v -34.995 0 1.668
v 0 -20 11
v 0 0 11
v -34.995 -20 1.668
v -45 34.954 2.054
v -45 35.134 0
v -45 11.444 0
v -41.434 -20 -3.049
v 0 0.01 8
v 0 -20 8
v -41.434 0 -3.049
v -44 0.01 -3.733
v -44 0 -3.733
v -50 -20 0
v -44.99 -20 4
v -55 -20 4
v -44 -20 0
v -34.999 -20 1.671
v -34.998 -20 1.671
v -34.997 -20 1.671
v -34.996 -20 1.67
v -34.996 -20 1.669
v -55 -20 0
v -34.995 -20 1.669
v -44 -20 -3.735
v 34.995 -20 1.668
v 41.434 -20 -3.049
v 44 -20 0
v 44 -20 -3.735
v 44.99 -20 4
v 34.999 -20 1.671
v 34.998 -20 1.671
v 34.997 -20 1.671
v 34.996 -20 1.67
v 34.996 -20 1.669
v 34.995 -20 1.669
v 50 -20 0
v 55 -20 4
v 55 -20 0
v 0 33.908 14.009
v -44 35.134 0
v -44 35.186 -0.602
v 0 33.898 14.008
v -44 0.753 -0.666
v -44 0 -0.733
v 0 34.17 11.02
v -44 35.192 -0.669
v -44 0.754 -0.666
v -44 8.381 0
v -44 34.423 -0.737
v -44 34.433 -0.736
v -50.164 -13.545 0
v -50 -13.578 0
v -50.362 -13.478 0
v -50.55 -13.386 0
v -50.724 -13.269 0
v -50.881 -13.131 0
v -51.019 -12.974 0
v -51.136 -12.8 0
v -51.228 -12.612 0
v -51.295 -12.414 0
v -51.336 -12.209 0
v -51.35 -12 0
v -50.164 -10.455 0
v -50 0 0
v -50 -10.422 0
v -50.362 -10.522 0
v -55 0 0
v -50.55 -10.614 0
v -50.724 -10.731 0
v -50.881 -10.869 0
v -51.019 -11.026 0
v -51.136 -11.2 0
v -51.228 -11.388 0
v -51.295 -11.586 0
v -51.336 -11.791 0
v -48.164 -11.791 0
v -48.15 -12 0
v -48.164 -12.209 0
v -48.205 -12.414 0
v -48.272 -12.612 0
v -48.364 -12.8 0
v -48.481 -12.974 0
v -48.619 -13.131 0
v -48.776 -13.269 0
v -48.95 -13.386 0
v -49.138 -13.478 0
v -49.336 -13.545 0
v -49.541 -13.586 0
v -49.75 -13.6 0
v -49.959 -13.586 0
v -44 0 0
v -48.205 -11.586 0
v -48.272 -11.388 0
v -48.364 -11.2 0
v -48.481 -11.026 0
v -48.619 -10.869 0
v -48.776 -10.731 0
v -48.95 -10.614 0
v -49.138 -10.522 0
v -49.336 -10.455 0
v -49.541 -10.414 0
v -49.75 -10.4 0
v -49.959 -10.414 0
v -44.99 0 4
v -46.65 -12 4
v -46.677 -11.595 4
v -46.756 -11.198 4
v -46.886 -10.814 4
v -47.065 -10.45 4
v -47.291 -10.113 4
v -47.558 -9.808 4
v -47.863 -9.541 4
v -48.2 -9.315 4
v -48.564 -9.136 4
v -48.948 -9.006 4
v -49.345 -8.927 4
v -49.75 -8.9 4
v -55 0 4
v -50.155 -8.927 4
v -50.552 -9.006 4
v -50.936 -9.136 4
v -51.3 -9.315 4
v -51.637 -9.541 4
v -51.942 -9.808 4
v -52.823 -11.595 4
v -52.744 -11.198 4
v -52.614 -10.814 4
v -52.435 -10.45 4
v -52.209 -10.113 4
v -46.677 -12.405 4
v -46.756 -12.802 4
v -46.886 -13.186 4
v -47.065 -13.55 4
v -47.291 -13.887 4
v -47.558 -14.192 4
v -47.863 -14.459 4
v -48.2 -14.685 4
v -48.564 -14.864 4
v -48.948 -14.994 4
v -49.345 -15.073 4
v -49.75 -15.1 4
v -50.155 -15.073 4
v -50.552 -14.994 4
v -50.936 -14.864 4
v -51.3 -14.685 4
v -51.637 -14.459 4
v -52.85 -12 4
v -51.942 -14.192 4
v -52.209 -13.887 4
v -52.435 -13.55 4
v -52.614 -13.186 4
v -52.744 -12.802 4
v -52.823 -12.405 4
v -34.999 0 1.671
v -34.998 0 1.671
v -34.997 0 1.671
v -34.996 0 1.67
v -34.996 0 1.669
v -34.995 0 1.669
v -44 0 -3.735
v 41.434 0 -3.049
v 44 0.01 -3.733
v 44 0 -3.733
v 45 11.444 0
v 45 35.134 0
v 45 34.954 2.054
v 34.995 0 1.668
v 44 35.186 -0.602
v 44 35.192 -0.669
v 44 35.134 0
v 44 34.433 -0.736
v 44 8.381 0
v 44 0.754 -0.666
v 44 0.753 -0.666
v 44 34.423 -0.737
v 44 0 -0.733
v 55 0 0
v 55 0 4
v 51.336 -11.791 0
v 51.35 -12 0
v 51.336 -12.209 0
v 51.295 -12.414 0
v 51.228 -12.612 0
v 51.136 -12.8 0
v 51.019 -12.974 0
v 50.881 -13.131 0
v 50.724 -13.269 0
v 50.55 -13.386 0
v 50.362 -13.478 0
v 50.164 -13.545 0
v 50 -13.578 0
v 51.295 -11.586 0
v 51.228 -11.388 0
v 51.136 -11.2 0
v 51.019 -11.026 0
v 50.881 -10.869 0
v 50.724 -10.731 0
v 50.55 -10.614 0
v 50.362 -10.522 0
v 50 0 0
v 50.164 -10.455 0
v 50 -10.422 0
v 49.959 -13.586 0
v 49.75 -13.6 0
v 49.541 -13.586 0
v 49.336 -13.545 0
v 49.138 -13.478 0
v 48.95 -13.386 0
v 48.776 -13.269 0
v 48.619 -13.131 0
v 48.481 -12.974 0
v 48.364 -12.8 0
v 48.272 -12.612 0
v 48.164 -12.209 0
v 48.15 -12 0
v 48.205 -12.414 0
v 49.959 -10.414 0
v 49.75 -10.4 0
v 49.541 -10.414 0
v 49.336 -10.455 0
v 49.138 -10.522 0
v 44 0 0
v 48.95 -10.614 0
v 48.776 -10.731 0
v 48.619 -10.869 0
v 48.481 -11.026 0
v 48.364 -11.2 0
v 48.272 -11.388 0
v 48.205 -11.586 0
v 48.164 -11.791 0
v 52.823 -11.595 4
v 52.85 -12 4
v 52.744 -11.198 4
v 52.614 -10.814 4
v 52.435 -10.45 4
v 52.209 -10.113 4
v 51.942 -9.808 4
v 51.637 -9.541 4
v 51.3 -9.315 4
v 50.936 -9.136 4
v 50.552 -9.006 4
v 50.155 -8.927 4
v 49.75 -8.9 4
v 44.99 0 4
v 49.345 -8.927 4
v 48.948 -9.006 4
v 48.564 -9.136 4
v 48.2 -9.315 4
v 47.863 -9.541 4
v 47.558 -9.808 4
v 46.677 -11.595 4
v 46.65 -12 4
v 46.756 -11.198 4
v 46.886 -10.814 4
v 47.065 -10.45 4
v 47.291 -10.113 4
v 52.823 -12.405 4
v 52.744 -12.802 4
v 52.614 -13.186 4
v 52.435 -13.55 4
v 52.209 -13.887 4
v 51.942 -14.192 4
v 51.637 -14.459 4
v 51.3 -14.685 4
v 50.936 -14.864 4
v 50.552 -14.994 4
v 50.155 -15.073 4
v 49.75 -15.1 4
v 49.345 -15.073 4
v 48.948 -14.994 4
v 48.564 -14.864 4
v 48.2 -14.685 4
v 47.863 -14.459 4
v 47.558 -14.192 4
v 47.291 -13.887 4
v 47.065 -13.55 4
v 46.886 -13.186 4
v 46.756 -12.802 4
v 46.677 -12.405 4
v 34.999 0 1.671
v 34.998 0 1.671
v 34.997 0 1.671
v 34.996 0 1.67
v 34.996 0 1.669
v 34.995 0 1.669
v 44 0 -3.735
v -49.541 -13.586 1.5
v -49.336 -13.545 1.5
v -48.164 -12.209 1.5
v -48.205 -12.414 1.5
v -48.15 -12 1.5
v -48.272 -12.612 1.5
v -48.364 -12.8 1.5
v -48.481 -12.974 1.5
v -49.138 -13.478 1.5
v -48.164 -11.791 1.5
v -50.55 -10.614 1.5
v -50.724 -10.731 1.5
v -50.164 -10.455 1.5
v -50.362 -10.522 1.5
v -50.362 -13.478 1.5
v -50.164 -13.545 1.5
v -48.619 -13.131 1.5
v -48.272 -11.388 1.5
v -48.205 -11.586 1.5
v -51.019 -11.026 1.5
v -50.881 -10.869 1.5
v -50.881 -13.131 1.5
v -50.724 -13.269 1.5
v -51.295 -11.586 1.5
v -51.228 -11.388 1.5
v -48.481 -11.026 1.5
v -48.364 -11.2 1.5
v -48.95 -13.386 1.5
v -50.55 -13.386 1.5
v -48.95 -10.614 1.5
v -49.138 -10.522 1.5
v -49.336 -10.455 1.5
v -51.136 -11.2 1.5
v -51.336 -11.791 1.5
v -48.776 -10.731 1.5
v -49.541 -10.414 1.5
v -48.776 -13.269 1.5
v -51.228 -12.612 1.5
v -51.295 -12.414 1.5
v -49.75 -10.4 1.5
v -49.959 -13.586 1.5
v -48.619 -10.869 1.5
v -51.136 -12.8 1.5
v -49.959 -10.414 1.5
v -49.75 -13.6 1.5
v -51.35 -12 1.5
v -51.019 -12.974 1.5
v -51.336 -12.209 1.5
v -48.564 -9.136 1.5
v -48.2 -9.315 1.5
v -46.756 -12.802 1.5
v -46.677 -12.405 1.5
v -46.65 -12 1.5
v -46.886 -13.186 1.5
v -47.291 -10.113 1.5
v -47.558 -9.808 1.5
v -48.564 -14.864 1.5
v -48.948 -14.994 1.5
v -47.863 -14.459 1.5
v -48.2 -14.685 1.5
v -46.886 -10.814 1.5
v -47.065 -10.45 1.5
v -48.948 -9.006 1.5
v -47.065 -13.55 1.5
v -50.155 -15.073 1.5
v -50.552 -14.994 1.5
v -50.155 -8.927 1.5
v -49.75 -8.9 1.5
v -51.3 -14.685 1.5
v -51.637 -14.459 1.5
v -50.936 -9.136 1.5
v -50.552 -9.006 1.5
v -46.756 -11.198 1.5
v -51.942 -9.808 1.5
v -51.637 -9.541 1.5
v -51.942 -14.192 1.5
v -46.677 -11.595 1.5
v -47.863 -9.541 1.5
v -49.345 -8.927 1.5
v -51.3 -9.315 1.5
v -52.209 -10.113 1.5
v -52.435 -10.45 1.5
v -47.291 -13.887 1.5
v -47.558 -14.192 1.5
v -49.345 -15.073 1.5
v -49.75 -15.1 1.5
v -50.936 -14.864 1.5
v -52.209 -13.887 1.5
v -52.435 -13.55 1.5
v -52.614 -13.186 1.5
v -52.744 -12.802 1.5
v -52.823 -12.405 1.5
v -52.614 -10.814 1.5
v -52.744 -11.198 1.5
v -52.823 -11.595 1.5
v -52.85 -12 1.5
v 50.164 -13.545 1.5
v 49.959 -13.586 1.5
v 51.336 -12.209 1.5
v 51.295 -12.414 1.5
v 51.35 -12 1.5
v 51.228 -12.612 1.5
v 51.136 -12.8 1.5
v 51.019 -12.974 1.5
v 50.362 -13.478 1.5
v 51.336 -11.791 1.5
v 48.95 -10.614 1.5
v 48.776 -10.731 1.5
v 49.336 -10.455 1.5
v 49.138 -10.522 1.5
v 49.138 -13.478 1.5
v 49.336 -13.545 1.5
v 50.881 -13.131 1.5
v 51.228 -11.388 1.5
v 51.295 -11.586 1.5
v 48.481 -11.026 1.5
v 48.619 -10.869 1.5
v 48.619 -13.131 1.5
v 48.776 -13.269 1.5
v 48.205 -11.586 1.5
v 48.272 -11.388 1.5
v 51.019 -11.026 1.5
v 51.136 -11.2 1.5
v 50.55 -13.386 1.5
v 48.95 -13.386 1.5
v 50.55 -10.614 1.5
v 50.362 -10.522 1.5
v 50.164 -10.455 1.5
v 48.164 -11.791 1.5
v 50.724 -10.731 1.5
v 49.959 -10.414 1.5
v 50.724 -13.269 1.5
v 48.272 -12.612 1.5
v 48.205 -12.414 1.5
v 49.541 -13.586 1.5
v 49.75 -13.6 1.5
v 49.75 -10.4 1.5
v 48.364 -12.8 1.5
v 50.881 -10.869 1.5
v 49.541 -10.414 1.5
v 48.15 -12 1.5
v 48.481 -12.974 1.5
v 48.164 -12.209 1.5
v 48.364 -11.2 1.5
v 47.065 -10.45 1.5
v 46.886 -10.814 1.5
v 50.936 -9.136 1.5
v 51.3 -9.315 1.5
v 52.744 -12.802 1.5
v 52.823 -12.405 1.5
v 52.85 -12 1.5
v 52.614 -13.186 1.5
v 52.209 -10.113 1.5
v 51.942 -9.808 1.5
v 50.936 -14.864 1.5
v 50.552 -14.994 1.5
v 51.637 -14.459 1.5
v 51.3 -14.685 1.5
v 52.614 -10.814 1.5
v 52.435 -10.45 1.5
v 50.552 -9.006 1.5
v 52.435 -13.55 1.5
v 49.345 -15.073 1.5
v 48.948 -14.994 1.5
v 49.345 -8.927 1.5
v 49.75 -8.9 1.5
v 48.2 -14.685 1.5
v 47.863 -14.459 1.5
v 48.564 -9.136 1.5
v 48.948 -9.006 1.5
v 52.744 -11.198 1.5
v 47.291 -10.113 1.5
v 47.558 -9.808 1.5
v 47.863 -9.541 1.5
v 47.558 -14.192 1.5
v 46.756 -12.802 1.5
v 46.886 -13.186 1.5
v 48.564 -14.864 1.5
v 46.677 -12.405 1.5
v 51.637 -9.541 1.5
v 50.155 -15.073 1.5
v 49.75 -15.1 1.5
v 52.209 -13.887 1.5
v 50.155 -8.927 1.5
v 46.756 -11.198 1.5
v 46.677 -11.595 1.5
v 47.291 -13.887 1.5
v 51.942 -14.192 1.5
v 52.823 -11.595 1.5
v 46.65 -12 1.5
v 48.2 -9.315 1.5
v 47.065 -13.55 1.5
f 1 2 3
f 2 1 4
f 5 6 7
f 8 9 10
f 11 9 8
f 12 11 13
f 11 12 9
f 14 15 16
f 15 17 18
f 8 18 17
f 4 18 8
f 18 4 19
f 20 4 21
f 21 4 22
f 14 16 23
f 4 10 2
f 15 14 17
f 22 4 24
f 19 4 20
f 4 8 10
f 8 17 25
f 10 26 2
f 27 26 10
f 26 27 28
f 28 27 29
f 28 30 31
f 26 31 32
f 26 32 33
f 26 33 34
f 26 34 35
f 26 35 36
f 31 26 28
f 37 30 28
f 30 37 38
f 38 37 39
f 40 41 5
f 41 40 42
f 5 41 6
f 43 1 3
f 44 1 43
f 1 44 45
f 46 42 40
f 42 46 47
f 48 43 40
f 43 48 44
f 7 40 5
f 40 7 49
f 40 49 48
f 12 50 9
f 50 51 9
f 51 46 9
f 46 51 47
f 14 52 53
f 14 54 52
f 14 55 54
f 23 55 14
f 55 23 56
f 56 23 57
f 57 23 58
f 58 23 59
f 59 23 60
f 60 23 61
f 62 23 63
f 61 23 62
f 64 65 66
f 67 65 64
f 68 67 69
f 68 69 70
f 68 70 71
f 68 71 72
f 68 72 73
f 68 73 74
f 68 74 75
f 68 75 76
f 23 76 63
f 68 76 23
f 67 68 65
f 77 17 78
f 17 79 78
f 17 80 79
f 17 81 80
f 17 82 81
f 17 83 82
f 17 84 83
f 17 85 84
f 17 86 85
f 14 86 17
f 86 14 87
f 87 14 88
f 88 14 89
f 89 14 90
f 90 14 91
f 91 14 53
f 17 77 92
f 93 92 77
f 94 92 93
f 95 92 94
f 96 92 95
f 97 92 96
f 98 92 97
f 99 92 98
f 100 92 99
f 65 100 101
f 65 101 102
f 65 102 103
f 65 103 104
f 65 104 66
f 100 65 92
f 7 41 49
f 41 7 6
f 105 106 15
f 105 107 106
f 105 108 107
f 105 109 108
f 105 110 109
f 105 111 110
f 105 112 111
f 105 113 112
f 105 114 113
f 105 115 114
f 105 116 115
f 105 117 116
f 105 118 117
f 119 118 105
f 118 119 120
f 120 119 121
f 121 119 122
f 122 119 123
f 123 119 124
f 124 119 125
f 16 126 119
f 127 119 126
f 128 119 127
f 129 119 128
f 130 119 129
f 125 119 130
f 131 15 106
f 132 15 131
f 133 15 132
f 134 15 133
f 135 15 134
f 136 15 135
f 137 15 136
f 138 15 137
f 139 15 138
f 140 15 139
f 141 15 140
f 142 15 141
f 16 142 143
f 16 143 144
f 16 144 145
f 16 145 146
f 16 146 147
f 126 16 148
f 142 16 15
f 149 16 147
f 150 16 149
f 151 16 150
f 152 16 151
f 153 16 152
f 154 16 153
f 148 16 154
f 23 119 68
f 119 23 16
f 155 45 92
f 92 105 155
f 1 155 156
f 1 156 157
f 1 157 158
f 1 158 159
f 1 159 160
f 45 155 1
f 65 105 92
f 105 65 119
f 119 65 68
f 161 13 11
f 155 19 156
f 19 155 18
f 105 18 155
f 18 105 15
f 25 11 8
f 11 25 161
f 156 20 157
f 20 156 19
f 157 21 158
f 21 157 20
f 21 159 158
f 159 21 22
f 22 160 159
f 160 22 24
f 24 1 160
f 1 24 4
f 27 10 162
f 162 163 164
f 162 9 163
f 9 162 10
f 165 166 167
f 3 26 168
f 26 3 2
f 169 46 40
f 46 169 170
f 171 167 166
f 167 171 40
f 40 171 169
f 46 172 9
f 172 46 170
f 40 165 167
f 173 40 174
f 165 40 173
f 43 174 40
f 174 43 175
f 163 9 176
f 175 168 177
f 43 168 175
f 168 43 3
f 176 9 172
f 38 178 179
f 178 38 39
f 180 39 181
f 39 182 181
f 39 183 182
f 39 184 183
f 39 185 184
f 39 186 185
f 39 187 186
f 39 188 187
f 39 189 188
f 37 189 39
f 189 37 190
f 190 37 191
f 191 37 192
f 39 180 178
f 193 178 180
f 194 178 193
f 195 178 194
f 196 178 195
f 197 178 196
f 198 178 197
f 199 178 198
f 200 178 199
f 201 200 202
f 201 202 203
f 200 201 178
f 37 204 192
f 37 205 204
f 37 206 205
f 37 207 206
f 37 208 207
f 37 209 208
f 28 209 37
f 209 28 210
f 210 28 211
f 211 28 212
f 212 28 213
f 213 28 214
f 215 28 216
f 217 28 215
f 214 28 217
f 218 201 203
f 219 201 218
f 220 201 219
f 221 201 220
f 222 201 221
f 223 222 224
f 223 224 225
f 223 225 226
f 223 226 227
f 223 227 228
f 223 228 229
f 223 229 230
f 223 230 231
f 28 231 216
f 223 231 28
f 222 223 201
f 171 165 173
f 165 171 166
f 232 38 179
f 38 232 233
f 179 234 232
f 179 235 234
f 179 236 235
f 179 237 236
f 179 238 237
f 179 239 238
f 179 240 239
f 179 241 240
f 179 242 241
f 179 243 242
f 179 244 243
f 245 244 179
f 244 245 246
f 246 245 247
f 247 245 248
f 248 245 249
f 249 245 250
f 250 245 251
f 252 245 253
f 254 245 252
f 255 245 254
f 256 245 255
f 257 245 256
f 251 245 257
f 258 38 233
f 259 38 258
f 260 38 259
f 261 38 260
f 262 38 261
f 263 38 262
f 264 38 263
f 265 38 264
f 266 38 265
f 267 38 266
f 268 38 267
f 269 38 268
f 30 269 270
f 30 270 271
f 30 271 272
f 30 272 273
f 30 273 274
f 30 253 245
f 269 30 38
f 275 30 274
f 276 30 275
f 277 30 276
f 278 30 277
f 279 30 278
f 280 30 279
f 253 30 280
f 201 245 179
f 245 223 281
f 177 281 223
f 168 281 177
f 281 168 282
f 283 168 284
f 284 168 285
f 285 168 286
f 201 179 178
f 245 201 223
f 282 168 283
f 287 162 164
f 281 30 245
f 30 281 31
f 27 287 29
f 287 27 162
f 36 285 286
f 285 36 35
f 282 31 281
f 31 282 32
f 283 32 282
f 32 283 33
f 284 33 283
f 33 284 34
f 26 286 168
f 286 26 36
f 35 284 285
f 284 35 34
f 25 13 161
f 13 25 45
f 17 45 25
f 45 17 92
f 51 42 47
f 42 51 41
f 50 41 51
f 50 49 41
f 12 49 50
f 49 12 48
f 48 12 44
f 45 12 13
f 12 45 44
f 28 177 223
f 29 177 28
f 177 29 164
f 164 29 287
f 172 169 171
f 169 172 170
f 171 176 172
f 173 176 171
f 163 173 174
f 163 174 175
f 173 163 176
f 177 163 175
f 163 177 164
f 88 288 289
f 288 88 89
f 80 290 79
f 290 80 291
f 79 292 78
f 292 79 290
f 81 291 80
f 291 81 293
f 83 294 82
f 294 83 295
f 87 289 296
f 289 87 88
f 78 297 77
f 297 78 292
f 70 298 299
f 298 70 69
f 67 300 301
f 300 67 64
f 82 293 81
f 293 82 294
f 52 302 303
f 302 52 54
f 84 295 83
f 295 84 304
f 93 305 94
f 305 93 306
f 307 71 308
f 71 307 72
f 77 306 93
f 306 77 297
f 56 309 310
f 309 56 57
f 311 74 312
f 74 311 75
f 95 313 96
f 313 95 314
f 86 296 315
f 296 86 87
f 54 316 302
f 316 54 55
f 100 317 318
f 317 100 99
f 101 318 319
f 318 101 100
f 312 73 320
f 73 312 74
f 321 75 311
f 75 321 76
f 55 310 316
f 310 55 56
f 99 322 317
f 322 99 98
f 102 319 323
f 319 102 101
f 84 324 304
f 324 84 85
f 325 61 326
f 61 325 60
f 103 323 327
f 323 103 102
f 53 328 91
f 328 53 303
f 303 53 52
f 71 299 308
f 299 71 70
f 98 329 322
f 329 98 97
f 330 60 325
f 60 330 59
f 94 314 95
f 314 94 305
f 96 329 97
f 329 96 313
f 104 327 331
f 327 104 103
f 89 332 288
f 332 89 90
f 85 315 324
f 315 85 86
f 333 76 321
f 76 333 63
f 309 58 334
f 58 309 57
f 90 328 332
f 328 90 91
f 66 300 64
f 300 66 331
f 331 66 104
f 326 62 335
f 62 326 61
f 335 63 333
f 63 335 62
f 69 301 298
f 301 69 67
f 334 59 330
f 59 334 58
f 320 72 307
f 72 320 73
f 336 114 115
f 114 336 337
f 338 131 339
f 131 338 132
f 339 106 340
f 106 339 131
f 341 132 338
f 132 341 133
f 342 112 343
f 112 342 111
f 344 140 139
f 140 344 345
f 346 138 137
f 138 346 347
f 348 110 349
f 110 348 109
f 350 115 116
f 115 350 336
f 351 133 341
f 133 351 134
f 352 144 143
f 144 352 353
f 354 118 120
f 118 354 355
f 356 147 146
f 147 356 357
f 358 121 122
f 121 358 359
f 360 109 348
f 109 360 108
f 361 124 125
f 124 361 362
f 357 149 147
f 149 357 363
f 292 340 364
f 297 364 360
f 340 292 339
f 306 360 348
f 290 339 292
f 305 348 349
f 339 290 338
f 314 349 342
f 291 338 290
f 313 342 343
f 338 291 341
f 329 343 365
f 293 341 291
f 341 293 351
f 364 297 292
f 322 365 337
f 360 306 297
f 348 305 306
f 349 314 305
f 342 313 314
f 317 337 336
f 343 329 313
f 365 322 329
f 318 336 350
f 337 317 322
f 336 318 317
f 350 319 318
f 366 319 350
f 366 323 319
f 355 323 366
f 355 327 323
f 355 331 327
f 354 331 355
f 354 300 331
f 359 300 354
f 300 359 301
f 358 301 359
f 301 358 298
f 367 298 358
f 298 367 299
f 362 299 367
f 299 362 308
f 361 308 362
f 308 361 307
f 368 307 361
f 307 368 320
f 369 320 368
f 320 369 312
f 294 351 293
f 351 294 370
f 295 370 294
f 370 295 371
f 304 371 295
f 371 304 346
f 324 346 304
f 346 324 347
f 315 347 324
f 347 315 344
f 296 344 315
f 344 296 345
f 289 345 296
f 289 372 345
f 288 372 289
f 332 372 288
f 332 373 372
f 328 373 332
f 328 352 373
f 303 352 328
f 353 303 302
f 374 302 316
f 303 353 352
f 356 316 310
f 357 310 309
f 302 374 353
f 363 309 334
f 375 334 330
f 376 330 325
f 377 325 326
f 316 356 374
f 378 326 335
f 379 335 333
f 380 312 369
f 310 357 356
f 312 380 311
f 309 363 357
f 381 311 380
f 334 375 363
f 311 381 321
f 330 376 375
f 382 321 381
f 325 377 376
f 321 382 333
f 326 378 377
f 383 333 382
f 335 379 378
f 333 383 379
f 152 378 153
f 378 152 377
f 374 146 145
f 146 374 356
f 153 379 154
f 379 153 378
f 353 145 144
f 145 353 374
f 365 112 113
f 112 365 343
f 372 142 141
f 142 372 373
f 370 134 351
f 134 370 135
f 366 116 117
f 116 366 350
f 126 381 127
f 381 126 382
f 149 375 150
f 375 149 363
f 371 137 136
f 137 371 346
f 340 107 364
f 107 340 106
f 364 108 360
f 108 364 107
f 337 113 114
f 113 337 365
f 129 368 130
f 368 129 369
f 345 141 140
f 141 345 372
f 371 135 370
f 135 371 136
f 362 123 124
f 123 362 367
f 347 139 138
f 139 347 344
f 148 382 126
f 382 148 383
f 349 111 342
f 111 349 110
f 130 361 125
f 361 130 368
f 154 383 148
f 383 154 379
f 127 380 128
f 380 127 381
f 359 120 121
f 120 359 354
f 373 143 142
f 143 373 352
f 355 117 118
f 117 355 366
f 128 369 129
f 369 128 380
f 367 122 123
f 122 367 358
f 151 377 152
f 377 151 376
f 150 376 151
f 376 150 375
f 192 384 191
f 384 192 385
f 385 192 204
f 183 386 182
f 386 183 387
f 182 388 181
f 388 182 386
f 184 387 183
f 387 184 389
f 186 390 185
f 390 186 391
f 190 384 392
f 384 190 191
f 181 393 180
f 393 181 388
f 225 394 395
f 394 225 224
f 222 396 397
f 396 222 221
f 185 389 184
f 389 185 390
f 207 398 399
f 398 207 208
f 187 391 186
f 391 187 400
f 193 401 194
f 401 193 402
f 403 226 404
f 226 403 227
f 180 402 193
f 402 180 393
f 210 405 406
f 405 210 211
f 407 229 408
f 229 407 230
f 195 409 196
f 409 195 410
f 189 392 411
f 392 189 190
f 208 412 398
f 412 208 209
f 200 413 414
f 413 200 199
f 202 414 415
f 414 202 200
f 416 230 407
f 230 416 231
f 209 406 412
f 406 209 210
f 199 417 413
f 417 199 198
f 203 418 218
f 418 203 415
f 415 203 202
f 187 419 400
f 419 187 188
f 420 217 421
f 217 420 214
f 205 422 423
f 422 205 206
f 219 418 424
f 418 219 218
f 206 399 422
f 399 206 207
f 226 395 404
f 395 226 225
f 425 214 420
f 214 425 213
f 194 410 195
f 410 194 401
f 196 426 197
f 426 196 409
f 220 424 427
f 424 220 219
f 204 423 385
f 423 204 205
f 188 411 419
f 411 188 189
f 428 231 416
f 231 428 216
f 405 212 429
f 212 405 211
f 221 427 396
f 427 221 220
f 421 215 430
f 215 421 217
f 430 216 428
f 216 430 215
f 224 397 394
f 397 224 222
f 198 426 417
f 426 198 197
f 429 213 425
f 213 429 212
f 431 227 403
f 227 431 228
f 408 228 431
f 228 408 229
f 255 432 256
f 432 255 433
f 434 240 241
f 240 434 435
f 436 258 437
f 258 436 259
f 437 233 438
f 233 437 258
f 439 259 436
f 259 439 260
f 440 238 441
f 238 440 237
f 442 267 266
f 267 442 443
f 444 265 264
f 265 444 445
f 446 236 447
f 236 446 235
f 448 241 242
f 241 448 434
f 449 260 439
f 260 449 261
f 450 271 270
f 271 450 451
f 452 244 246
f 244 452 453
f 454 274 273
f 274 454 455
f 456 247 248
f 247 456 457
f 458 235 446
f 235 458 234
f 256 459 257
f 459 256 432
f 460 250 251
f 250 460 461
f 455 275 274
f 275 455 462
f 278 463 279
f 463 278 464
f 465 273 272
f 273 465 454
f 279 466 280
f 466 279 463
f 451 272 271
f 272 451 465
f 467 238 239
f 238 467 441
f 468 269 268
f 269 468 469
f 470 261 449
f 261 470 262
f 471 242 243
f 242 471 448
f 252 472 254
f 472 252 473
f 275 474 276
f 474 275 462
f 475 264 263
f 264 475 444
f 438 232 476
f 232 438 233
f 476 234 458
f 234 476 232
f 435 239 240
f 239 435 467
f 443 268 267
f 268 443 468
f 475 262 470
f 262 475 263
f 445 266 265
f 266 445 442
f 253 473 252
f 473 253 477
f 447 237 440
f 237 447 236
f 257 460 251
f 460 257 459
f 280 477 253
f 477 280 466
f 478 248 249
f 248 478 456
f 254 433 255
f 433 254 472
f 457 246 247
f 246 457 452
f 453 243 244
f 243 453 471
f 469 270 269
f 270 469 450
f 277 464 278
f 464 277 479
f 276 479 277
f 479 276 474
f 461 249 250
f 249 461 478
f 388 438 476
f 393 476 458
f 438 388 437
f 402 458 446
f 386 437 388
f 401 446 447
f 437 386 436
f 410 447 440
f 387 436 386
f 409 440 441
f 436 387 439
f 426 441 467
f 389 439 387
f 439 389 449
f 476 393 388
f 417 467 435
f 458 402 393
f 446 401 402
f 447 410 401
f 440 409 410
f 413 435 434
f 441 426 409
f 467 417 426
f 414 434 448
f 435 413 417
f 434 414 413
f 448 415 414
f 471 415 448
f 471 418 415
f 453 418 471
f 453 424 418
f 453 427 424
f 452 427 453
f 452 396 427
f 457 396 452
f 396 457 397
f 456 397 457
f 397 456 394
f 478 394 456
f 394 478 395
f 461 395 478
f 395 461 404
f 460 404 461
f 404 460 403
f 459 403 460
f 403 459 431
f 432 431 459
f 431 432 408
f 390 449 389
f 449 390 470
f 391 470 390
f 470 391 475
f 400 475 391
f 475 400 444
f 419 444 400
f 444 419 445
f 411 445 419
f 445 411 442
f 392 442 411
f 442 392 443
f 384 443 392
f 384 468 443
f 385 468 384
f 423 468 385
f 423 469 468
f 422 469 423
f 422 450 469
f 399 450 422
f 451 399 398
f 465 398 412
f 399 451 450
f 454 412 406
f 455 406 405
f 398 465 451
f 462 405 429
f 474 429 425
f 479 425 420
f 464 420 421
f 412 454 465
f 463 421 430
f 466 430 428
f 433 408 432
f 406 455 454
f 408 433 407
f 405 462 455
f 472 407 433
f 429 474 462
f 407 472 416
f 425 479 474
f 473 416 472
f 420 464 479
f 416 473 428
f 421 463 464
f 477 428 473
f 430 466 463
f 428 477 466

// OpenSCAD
// ===========================================================================
// trim_tab.scad — CENTRE TRIM TAB for the D007's transom, bolt-on, no new holes
// in the hull. Print the angle ladder: 0°, 5°, 10° (plus the fit gauge first).
// ---------------------------------------------------------------------------
// WHY (2026-10-20 pool runs, docs/03): near hull speed (~1 m/s) the nose
// climbs: loaded 15° at the MOT_THR_MAX 50 limit. A plate sticking out behind
// the transom with its trailing edge angled down gets pushed UP by the water,
// lifting the stern and lowering the nose. Honest expectation (Claude,
// 2026-10-20): small at 1 m/s, because lift grows with speed squared; roughly
// 10-15 % of the nose-up push at 10°. A cheap bolt-on test, nothing unsealed.
//
// WHERE: the centre section between the two v2 mount bases (90 mm wide). The
// ducts fill the rest of the 230 mm transom, and a plate behind a duct would
// sit in its jet.
//
// SHAPE (Cobus, 2026-10-20; VERIFY with part = "gauge"): the centre section is
// a shallow V. The v2 bases' underside is 4 mm DEEPER than the V's edges (first
// read the other way round from his sketch); the keel line is 12 mm deeper than
// the edges, so 8 mm below the bases' underside.
//
//   seen from behind, water BELOW:
//      hull ═══╗╲_______________╱╔═══ hull        V edges: z = +4
//      base ███║ ╲             ╱ ║███ base        base underside: z = 0
//      ear  ▓▓▓▓  ╲   centre  ╱  ▓▓▓▓ ear  (post screw UP through it)
//                  ╲_________╱  tab hugs the V, 3 mm thick; keel z = -8
//
// FIXING (Cobus, 2026-10-20): two ears reach sideways under the inboard edge of
// each base and sit under that base's EXISTING inboard aft post screw (12 mm
// forward of the transom; holes 99.5 mm apart, found with the fit gauge). Take the
// screw out, fit the tab, put the screw back through the ear. Nothing new goes
// into the hull or the base. The 4 mm ear moves the head 3.5 mm down, so an
// ST2.9 x 13 keeps ~4.5 mm in the post: fine for a pool test; x 16 to keep it on.
//
// Model axes: X across (0 = keel line), Y forward from the transom (0 = transom
// edge, negative = behind the boat), Z up (0 = the bases' underside; the water
// is below). Units mm.
//
//   openscad -D 'part="tab"' -D angle=5 -o stl/trim_tab_05.stl trim_tab.scad
//   part = "tab" | "gauge" | "assembly"
// Print: ASA or ABS, top face (the one that hugs the hull) on the bed, which
// needs a little support under the V; or print the gauge first and check.
// ===========================================================================

part  = "tab";
angle = 5;          // trailing edge down, degrees. Ladder: 0, 5, 10

// --- the hull's centre section at the transom (VERIFY) ------------------------
gap     = 90;       // Cobus #3: between the two bases
edge_z  = 4;        // Cobus 2026-10-20: the V's edges are 4 mm ABOVE (shallower than) the bases' underside
keel_z  = -8;       // keel line: 12 mm below the edges (Cobus's sketch), so 8 below the bases

// --- the tab ------------------------------------------------------------------
t       = 3;        // plate thickness
fwd     = 20;       // under the hull, forward of the transom (seats the V; matches the ears)
aft     = 35;       // sticks out behind the transom
te_r    = 1.0;      // trailing edge round (approx, by chamfer)

// --- ears and screws ----------------------------------------------------------
ear_w   = 10;       // sideways under each base
ear_t   = 4;        // ear thickness under the base
edge_cut = 1;       // Cobus, 2026-10-20 (fit gauge): plate edges 1 mm further in on both
                    // sides, so they clear the base's inboard face (cut above the ears only)
ramp_w  = 10;       // the ramp joining the plate edge (z +1..+4) to the ear (z -4..0) starts this far in
ear_l   = 20;       // forward from the transom (the post screw sits at 12)
screw_x = gap / 2 + 4.75; // screw centre from the keel line. Cobus, 2026-10-20 (fit gauge):
                          // holes 1 mm, then another 0.5 mm, further apart than first
                          // drawn (was + 4): 99.5 mm centre to centre
screw_y = 12;            // forward of the transom. Cobus, 2026-10-20: the ears go on the bases'
                         // EXISTING inboard post screws (no new holes), 12 mm forward
screw_d = 3.2;           // clearance for ST2.9 / M3
head_d  = 6.2;  head_h = 2.5;   // pan head pocket from below, 1.5 mm floor left in the 4 mm ear
// the v2 base: duct right under it (tunnel centre 81 mm out, duct OD 74),
// inboard post screw at 51.5 across, 12 forward (base 72 wide, post_x 29.5)
tun_x   = gap / 2 + 36;
post_xy = [tun_x - 29.5, 12];
duct_r  = 37;

$fn = 48;
half = gap / 2;
function vz(x) = edge_z - (edge_z - keel_z) * (1 - abs(x) / half);   // hull surface

// --- checks -------------------------------------------------------------------
assert(angle >= 0 && angle <= 15, "angle 0-15");
// The ear screw IS the base's inboard aft post screw. Its head moves from 2 mm
// up inside the base to 1.5 mm below the base's underside: 3.5 mm less in the
// post (ST2.9 x 13: ~4.5 mm left; x 16: ~7.5).
duct_top = -duct_r + sqrt(max(duct_r * duct_r - pow(tun_x - (half + ear_w), 2), 0));   // at the ear's outer edge
ear_bottom = -ear_t;
assert(ear_bottom - duct_top >= 2, str("ear too close to the duct: ", ear_bottom - duct_top, " mm"));
echo(str("Tab ", angle, "°: trailing edge ", aft * sin(angle), " mm lower than at the transom; ",
         "ear to duct clearance ", ear_bottom - duct_top, " mm."));

// one half of the V as an (x, z) profile, 3 mm thick below the hull surface
module half_profile(s) {   // s = +1 / -1 side
    polygon([[0, vz(0)], [s * half, vz(half)], [s * half, vz(half) - t], [0, vz(0) - t]]);
}
module slab(y0, y1, s) { translate([0, y1, 0]) rotate([90, 0, 0]) linear_extrude(y1 - y0) half_profile(s); }
module tilt() { rotate([angle, 0, 0]) children(); }   // about the transom line: aft end goes DOWN

module tab() {
    difference() {
        union() {
            for (s = [-1, 1]) {
                slab(0, fwd, s);                                   // seats on the V under the hull
                hull() { slab(-0.01, 0, s); tilt() slab(-aft, -aft + 0.01, s); }   // the tab itself
                // ear: out under the base, top flat on the base's underside
                translate([s > 0 ? half : -half - ear_w, 0, -ear_t]) cube([ear_w, ear_l, ear_t]);
                // join: the V's edge is 4 mm higher than the base's underside, so the
                // plate and the ear don't touch. A smooth ramp under the plate edge
                // (from ramp_w in, down to the ear) bridges them: no square stub
                // (Cobus, 2026-10-20: the first block showed as a step).
                hull() {
                    translate([s * (half - ramp_w), 0, vz(half - ramp_w) - t]) rotate([-90, 0, 0]) cylinder(d = 0.01, h = ear_l);
                    translate([s > 0 ? half - 0.01 : -half, 0, -ear_t]) cube([0.01, ear_l, edge_z + ear_t]);
                    translate([s * (half - ramp_w), 0, vz(half - ramp_w) - 0.01]) rotate([-90, 0, 0]) cylinder(d = 0.01, h = ear_l);
                }
            }
        }
        // plate edges 1 mm in: cut everything above the ears' top in the last mm
        for (s = [-1, 1]) translate([s > 0 ? half - edge_cut : -half - 5, -aft - 5, 0]) cube([edge_cut + 5, aft + fwd + 10, 20]);
        // ear screws, up into the base, pan head pocket from below
        for (s = [-1, 1]) translate([s * screw_x, screw_y, 0]) {
            translate([0, 0, -20]) cylinder(d = screw_d, h = 25);
            translate([0, 0, -ear_t - 1]) cylinder(d = head_d, h = head_h + 1);
        }
    }
}

// thin V gauge: 2 mm slice of the forward part + ears, to check the hull's V and the
// ear holes before printing the tabs
module gauge() {
    intersection() { tab(); translate([-100, 0, -50]) cube([200, ear_l, 60]); }
}

module dummy() {   // hull centre section, bases, ducts: for the assembly render
    color("DimGray", 0.5) translate([0, 60, 0]) rotate([90, 0, 0])
        linear_extrude(60, center = false) polygon([[-half, vz(half)], [0, vz(0)], [half, vz(half)], [half, 14], [-half, 14]]);
    for (s = [-1, 1]) {
        color("SteelBlue", 0.7) translate([s > 0 ? half : -half - 72, 0, 0]) cube([72, 80, 7]);
        color("YellowGreen", 0.5) translate([s * tun_x, 0, -duct_r]) rotate([-90, 0, 0]) difference() { cylinder(r = duct_r, h = 75); translate([0, 0, -1]) cylinder(r = duct_r - 3, h = 77); }
    }
}

if (part == "tab")           rotate([180, 0, 0]) tab();           // hull face on the bed
else if (part == "gauge")    rotate([180, 0, 0]) gauge();
else if (part == "assembly") { color("DarkOrange") tab(); dummy(); }
